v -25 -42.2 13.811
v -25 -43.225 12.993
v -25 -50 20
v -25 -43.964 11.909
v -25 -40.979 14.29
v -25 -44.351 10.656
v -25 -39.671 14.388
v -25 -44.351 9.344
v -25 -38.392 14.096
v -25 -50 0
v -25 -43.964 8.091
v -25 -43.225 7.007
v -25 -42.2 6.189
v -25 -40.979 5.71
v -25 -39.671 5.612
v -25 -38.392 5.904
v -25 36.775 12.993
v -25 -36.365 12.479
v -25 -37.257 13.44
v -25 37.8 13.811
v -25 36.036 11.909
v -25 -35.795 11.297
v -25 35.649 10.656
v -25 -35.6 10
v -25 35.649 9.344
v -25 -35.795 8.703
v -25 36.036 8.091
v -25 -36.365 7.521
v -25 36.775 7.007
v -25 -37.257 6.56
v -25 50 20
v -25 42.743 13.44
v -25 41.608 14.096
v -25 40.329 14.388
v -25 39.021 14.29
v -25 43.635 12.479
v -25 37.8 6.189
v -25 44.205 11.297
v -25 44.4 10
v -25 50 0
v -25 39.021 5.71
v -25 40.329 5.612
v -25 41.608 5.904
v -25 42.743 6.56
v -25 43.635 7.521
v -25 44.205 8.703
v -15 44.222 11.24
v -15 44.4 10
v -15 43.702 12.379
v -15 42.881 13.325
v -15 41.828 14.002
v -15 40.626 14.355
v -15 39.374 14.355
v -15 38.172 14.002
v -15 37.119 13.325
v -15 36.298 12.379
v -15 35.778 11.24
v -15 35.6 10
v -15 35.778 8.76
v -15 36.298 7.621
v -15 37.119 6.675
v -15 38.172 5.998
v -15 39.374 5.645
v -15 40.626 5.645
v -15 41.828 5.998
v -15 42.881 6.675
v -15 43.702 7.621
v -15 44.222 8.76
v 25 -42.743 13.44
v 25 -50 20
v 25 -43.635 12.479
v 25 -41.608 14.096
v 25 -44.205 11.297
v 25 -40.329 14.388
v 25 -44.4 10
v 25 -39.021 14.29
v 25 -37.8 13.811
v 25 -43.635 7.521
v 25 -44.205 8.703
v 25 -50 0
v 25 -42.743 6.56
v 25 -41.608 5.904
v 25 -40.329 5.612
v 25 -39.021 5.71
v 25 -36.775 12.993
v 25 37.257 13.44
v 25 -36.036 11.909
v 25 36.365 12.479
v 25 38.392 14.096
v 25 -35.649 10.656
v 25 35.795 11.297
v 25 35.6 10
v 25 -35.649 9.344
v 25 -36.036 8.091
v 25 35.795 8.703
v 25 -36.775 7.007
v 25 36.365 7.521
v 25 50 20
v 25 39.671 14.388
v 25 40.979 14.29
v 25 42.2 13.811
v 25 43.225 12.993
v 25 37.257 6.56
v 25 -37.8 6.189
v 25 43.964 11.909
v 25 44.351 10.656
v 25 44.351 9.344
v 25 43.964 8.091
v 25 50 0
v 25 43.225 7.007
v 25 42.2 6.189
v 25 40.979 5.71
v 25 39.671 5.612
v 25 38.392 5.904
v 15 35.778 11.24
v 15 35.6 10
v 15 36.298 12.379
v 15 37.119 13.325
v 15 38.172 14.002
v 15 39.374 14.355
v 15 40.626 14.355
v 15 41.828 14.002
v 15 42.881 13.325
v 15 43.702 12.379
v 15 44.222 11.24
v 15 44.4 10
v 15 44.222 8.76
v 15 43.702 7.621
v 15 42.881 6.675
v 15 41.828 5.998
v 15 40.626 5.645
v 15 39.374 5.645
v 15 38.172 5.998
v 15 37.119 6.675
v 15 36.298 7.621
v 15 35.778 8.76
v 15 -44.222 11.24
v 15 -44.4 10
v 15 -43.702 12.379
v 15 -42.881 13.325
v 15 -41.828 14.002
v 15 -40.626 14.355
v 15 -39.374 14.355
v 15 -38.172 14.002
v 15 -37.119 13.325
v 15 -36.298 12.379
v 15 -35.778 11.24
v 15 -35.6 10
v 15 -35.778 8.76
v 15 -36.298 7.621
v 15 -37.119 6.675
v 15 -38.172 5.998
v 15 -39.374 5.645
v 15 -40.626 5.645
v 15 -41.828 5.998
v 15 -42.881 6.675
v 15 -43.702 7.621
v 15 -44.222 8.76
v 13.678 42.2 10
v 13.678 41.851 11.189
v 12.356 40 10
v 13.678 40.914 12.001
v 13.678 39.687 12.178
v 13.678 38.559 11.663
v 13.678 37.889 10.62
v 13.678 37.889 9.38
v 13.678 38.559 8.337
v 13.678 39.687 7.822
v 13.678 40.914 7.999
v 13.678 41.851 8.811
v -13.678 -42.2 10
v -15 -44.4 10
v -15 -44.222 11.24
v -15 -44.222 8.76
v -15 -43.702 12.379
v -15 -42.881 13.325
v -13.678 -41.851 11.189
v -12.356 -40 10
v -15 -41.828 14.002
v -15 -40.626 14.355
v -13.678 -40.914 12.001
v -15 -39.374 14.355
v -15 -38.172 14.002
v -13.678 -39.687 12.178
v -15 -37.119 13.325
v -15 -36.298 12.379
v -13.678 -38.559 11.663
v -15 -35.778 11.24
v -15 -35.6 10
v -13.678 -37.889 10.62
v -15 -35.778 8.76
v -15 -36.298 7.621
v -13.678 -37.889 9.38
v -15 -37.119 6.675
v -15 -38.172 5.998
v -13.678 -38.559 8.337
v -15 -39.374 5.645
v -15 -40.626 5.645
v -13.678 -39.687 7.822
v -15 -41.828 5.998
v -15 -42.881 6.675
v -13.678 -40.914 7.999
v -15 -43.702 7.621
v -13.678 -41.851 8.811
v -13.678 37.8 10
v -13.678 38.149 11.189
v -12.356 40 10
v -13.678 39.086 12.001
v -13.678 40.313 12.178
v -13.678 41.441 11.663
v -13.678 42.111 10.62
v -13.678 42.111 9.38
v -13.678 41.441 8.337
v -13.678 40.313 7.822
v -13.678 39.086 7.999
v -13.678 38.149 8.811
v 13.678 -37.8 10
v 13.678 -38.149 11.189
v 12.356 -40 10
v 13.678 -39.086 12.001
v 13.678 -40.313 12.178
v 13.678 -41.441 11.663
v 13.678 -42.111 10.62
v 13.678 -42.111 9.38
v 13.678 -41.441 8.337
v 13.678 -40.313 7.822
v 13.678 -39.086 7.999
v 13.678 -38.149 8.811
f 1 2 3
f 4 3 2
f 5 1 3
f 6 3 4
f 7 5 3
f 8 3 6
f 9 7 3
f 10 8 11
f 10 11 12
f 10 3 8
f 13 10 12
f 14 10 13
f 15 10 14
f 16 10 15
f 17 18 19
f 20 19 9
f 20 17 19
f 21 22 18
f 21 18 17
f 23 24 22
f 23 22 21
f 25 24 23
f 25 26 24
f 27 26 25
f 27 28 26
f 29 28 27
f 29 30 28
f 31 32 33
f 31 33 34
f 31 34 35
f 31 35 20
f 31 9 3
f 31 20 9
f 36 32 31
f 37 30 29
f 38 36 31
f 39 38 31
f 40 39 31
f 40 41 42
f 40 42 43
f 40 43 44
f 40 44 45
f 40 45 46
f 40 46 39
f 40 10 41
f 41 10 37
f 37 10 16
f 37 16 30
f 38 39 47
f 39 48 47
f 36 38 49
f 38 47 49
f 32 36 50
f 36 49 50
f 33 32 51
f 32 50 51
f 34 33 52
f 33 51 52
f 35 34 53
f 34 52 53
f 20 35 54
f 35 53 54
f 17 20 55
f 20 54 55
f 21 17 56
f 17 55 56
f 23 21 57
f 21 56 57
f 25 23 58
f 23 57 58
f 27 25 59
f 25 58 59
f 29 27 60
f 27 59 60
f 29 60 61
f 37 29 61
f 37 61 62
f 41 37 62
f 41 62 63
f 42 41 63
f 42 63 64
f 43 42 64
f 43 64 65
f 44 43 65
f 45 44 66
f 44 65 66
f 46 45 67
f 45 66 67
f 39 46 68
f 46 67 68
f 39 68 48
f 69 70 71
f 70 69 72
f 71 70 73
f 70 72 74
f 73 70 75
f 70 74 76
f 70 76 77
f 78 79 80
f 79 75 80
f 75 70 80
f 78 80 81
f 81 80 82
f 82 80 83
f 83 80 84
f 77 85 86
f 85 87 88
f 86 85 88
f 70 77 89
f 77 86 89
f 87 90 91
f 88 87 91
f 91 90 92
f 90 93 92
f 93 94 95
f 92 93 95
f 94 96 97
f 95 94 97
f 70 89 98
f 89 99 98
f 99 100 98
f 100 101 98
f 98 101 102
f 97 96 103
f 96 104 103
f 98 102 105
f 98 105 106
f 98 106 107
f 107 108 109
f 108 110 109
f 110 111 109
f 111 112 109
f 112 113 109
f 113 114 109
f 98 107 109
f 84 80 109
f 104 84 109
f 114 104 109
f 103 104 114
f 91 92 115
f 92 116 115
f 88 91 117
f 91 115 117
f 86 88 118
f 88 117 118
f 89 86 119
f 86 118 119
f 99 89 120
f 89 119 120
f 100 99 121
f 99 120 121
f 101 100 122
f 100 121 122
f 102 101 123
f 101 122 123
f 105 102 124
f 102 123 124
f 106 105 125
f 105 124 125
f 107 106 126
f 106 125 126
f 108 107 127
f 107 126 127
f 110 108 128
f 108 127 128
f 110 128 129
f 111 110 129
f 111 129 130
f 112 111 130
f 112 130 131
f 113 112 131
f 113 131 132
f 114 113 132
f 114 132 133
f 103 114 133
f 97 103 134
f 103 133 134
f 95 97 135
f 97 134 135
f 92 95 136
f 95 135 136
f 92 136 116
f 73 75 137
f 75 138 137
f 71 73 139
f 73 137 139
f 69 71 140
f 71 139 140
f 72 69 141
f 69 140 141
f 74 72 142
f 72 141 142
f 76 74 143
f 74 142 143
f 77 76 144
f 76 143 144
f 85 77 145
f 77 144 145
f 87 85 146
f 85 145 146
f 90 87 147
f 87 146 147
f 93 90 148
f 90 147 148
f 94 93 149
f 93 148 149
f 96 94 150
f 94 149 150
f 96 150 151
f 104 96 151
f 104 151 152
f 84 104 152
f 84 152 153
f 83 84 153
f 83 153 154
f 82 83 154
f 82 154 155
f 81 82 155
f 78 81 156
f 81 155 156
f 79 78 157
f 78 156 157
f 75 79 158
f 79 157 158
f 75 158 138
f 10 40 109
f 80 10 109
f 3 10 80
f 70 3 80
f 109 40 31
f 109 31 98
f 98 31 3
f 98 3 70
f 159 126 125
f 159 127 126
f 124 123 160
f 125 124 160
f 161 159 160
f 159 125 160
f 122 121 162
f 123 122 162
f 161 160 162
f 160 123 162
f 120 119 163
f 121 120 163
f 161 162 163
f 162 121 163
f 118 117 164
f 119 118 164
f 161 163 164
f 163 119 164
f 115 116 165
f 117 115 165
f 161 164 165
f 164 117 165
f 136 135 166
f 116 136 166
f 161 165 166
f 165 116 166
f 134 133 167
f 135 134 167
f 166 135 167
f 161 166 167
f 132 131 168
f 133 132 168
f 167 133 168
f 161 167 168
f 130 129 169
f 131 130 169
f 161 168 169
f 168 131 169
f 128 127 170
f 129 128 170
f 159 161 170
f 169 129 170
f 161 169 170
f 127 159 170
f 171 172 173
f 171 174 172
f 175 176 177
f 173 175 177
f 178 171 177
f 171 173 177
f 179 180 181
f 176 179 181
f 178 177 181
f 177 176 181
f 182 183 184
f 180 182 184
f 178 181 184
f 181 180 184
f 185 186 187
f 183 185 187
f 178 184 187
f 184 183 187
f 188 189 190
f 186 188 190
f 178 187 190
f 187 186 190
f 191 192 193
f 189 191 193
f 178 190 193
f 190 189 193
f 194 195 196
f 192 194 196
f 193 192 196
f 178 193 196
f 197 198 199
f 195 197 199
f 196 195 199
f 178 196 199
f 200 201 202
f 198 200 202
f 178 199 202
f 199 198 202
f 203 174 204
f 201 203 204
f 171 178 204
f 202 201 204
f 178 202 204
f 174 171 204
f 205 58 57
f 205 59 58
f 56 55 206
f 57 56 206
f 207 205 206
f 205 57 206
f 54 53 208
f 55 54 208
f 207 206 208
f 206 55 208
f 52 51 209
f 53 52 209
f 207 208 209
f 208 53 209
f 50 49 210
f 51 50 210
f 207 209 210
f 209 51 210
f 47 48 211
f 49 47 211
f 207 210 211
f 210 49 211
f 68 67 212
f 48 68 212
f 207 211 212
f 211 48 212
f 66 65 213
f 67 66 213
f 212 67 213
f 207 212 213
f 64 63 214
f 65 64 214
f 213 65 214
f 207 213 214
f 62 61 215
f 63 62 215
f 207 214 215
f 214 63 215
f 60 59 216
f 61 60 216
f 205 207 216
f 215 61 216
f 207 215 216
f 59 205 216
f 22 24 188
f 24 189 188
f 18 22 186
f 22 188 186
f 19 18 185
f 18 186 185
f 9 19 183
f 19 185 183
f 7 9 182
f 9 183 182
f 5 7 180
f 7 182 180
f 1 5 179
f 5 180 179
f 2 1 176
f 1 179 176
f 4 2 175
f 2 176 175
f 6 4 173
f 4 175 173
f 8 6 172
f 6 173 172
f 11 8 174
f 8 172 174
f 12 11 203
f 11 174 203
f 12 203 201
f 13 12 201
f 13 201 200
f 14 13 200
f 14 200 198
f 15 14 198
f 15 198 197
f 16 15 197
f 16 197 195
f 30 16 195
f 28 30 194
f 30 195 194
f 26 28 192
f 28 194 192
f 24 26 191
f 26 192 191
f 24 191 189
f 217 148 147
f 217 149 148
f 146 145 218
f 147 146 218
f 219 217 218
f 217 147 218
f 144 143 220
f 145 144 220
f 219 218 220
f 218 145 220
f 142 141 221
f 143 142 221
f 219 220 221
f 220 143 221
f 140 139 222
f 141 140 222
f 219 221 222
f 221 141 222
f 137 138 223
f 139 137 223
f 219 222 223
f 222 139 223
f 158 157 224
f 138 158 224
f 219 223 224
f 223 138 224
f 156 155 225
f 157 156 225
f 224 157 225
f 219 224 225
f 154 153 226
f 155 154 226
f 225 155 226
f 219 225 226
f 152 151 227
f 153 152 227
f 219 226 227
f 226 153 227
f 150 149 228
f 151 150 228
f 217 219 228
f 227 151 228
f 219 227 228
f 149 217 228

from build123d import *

# Parameters (mm, degrees)
F0_W           = 50
F0_H           = 100
F1_DEPTH       = 20
F4_D           = 8.8
F4_DEPTH       = 10
F4_TIP         = 2.6437867237
F4_ON_F2_D     = 8.8
F4_ON_F2_DEPTH = 10
F4_ON_F2_TIP   = 2.6437867237


with BuildPart() as f1:
    # F0 (on Top) → F1 (new body)
    with BuildSketch(Plane.XY):
        Rectangle(F0_W, F0_H)
    extrude(amount=F1_DEPTH)

    # F4
    with Locations(Plane.YZ.offset(25)):
        with Locations((-40, 10), (40, 10)):
            Hole(F4_D / 2, depth=F4_DEPTH)
            with Locations((0, 0, -(F4_DEPTH + F4_TIP / 2))):  # 118° drill point
                Cone(0, F4_D / 2, F4_TIP, mode=Mode.SUBTRACT)

    # F4 on F2
    with Locations(Plane(origin=(-25, 0, 0), x_dir=(0, -1, 0), z_dir=(-1, 0, 0))):
        with Locations((-40, 10), (40, 10)):
            Hole(F4_ON_F2_D / 2, depth=F4_ON_F2_DEPTH)
            with Locations((0, 0, -(F4_ON_F2_DEPTH + F4_ON_F2_TIP / 2))):  # 118° drill point
                Cone(0, F4_ON_F2_D / 2, F4_ON_F2_TIP, mode=Mode.SUBTRACT)


solid = f1.part
